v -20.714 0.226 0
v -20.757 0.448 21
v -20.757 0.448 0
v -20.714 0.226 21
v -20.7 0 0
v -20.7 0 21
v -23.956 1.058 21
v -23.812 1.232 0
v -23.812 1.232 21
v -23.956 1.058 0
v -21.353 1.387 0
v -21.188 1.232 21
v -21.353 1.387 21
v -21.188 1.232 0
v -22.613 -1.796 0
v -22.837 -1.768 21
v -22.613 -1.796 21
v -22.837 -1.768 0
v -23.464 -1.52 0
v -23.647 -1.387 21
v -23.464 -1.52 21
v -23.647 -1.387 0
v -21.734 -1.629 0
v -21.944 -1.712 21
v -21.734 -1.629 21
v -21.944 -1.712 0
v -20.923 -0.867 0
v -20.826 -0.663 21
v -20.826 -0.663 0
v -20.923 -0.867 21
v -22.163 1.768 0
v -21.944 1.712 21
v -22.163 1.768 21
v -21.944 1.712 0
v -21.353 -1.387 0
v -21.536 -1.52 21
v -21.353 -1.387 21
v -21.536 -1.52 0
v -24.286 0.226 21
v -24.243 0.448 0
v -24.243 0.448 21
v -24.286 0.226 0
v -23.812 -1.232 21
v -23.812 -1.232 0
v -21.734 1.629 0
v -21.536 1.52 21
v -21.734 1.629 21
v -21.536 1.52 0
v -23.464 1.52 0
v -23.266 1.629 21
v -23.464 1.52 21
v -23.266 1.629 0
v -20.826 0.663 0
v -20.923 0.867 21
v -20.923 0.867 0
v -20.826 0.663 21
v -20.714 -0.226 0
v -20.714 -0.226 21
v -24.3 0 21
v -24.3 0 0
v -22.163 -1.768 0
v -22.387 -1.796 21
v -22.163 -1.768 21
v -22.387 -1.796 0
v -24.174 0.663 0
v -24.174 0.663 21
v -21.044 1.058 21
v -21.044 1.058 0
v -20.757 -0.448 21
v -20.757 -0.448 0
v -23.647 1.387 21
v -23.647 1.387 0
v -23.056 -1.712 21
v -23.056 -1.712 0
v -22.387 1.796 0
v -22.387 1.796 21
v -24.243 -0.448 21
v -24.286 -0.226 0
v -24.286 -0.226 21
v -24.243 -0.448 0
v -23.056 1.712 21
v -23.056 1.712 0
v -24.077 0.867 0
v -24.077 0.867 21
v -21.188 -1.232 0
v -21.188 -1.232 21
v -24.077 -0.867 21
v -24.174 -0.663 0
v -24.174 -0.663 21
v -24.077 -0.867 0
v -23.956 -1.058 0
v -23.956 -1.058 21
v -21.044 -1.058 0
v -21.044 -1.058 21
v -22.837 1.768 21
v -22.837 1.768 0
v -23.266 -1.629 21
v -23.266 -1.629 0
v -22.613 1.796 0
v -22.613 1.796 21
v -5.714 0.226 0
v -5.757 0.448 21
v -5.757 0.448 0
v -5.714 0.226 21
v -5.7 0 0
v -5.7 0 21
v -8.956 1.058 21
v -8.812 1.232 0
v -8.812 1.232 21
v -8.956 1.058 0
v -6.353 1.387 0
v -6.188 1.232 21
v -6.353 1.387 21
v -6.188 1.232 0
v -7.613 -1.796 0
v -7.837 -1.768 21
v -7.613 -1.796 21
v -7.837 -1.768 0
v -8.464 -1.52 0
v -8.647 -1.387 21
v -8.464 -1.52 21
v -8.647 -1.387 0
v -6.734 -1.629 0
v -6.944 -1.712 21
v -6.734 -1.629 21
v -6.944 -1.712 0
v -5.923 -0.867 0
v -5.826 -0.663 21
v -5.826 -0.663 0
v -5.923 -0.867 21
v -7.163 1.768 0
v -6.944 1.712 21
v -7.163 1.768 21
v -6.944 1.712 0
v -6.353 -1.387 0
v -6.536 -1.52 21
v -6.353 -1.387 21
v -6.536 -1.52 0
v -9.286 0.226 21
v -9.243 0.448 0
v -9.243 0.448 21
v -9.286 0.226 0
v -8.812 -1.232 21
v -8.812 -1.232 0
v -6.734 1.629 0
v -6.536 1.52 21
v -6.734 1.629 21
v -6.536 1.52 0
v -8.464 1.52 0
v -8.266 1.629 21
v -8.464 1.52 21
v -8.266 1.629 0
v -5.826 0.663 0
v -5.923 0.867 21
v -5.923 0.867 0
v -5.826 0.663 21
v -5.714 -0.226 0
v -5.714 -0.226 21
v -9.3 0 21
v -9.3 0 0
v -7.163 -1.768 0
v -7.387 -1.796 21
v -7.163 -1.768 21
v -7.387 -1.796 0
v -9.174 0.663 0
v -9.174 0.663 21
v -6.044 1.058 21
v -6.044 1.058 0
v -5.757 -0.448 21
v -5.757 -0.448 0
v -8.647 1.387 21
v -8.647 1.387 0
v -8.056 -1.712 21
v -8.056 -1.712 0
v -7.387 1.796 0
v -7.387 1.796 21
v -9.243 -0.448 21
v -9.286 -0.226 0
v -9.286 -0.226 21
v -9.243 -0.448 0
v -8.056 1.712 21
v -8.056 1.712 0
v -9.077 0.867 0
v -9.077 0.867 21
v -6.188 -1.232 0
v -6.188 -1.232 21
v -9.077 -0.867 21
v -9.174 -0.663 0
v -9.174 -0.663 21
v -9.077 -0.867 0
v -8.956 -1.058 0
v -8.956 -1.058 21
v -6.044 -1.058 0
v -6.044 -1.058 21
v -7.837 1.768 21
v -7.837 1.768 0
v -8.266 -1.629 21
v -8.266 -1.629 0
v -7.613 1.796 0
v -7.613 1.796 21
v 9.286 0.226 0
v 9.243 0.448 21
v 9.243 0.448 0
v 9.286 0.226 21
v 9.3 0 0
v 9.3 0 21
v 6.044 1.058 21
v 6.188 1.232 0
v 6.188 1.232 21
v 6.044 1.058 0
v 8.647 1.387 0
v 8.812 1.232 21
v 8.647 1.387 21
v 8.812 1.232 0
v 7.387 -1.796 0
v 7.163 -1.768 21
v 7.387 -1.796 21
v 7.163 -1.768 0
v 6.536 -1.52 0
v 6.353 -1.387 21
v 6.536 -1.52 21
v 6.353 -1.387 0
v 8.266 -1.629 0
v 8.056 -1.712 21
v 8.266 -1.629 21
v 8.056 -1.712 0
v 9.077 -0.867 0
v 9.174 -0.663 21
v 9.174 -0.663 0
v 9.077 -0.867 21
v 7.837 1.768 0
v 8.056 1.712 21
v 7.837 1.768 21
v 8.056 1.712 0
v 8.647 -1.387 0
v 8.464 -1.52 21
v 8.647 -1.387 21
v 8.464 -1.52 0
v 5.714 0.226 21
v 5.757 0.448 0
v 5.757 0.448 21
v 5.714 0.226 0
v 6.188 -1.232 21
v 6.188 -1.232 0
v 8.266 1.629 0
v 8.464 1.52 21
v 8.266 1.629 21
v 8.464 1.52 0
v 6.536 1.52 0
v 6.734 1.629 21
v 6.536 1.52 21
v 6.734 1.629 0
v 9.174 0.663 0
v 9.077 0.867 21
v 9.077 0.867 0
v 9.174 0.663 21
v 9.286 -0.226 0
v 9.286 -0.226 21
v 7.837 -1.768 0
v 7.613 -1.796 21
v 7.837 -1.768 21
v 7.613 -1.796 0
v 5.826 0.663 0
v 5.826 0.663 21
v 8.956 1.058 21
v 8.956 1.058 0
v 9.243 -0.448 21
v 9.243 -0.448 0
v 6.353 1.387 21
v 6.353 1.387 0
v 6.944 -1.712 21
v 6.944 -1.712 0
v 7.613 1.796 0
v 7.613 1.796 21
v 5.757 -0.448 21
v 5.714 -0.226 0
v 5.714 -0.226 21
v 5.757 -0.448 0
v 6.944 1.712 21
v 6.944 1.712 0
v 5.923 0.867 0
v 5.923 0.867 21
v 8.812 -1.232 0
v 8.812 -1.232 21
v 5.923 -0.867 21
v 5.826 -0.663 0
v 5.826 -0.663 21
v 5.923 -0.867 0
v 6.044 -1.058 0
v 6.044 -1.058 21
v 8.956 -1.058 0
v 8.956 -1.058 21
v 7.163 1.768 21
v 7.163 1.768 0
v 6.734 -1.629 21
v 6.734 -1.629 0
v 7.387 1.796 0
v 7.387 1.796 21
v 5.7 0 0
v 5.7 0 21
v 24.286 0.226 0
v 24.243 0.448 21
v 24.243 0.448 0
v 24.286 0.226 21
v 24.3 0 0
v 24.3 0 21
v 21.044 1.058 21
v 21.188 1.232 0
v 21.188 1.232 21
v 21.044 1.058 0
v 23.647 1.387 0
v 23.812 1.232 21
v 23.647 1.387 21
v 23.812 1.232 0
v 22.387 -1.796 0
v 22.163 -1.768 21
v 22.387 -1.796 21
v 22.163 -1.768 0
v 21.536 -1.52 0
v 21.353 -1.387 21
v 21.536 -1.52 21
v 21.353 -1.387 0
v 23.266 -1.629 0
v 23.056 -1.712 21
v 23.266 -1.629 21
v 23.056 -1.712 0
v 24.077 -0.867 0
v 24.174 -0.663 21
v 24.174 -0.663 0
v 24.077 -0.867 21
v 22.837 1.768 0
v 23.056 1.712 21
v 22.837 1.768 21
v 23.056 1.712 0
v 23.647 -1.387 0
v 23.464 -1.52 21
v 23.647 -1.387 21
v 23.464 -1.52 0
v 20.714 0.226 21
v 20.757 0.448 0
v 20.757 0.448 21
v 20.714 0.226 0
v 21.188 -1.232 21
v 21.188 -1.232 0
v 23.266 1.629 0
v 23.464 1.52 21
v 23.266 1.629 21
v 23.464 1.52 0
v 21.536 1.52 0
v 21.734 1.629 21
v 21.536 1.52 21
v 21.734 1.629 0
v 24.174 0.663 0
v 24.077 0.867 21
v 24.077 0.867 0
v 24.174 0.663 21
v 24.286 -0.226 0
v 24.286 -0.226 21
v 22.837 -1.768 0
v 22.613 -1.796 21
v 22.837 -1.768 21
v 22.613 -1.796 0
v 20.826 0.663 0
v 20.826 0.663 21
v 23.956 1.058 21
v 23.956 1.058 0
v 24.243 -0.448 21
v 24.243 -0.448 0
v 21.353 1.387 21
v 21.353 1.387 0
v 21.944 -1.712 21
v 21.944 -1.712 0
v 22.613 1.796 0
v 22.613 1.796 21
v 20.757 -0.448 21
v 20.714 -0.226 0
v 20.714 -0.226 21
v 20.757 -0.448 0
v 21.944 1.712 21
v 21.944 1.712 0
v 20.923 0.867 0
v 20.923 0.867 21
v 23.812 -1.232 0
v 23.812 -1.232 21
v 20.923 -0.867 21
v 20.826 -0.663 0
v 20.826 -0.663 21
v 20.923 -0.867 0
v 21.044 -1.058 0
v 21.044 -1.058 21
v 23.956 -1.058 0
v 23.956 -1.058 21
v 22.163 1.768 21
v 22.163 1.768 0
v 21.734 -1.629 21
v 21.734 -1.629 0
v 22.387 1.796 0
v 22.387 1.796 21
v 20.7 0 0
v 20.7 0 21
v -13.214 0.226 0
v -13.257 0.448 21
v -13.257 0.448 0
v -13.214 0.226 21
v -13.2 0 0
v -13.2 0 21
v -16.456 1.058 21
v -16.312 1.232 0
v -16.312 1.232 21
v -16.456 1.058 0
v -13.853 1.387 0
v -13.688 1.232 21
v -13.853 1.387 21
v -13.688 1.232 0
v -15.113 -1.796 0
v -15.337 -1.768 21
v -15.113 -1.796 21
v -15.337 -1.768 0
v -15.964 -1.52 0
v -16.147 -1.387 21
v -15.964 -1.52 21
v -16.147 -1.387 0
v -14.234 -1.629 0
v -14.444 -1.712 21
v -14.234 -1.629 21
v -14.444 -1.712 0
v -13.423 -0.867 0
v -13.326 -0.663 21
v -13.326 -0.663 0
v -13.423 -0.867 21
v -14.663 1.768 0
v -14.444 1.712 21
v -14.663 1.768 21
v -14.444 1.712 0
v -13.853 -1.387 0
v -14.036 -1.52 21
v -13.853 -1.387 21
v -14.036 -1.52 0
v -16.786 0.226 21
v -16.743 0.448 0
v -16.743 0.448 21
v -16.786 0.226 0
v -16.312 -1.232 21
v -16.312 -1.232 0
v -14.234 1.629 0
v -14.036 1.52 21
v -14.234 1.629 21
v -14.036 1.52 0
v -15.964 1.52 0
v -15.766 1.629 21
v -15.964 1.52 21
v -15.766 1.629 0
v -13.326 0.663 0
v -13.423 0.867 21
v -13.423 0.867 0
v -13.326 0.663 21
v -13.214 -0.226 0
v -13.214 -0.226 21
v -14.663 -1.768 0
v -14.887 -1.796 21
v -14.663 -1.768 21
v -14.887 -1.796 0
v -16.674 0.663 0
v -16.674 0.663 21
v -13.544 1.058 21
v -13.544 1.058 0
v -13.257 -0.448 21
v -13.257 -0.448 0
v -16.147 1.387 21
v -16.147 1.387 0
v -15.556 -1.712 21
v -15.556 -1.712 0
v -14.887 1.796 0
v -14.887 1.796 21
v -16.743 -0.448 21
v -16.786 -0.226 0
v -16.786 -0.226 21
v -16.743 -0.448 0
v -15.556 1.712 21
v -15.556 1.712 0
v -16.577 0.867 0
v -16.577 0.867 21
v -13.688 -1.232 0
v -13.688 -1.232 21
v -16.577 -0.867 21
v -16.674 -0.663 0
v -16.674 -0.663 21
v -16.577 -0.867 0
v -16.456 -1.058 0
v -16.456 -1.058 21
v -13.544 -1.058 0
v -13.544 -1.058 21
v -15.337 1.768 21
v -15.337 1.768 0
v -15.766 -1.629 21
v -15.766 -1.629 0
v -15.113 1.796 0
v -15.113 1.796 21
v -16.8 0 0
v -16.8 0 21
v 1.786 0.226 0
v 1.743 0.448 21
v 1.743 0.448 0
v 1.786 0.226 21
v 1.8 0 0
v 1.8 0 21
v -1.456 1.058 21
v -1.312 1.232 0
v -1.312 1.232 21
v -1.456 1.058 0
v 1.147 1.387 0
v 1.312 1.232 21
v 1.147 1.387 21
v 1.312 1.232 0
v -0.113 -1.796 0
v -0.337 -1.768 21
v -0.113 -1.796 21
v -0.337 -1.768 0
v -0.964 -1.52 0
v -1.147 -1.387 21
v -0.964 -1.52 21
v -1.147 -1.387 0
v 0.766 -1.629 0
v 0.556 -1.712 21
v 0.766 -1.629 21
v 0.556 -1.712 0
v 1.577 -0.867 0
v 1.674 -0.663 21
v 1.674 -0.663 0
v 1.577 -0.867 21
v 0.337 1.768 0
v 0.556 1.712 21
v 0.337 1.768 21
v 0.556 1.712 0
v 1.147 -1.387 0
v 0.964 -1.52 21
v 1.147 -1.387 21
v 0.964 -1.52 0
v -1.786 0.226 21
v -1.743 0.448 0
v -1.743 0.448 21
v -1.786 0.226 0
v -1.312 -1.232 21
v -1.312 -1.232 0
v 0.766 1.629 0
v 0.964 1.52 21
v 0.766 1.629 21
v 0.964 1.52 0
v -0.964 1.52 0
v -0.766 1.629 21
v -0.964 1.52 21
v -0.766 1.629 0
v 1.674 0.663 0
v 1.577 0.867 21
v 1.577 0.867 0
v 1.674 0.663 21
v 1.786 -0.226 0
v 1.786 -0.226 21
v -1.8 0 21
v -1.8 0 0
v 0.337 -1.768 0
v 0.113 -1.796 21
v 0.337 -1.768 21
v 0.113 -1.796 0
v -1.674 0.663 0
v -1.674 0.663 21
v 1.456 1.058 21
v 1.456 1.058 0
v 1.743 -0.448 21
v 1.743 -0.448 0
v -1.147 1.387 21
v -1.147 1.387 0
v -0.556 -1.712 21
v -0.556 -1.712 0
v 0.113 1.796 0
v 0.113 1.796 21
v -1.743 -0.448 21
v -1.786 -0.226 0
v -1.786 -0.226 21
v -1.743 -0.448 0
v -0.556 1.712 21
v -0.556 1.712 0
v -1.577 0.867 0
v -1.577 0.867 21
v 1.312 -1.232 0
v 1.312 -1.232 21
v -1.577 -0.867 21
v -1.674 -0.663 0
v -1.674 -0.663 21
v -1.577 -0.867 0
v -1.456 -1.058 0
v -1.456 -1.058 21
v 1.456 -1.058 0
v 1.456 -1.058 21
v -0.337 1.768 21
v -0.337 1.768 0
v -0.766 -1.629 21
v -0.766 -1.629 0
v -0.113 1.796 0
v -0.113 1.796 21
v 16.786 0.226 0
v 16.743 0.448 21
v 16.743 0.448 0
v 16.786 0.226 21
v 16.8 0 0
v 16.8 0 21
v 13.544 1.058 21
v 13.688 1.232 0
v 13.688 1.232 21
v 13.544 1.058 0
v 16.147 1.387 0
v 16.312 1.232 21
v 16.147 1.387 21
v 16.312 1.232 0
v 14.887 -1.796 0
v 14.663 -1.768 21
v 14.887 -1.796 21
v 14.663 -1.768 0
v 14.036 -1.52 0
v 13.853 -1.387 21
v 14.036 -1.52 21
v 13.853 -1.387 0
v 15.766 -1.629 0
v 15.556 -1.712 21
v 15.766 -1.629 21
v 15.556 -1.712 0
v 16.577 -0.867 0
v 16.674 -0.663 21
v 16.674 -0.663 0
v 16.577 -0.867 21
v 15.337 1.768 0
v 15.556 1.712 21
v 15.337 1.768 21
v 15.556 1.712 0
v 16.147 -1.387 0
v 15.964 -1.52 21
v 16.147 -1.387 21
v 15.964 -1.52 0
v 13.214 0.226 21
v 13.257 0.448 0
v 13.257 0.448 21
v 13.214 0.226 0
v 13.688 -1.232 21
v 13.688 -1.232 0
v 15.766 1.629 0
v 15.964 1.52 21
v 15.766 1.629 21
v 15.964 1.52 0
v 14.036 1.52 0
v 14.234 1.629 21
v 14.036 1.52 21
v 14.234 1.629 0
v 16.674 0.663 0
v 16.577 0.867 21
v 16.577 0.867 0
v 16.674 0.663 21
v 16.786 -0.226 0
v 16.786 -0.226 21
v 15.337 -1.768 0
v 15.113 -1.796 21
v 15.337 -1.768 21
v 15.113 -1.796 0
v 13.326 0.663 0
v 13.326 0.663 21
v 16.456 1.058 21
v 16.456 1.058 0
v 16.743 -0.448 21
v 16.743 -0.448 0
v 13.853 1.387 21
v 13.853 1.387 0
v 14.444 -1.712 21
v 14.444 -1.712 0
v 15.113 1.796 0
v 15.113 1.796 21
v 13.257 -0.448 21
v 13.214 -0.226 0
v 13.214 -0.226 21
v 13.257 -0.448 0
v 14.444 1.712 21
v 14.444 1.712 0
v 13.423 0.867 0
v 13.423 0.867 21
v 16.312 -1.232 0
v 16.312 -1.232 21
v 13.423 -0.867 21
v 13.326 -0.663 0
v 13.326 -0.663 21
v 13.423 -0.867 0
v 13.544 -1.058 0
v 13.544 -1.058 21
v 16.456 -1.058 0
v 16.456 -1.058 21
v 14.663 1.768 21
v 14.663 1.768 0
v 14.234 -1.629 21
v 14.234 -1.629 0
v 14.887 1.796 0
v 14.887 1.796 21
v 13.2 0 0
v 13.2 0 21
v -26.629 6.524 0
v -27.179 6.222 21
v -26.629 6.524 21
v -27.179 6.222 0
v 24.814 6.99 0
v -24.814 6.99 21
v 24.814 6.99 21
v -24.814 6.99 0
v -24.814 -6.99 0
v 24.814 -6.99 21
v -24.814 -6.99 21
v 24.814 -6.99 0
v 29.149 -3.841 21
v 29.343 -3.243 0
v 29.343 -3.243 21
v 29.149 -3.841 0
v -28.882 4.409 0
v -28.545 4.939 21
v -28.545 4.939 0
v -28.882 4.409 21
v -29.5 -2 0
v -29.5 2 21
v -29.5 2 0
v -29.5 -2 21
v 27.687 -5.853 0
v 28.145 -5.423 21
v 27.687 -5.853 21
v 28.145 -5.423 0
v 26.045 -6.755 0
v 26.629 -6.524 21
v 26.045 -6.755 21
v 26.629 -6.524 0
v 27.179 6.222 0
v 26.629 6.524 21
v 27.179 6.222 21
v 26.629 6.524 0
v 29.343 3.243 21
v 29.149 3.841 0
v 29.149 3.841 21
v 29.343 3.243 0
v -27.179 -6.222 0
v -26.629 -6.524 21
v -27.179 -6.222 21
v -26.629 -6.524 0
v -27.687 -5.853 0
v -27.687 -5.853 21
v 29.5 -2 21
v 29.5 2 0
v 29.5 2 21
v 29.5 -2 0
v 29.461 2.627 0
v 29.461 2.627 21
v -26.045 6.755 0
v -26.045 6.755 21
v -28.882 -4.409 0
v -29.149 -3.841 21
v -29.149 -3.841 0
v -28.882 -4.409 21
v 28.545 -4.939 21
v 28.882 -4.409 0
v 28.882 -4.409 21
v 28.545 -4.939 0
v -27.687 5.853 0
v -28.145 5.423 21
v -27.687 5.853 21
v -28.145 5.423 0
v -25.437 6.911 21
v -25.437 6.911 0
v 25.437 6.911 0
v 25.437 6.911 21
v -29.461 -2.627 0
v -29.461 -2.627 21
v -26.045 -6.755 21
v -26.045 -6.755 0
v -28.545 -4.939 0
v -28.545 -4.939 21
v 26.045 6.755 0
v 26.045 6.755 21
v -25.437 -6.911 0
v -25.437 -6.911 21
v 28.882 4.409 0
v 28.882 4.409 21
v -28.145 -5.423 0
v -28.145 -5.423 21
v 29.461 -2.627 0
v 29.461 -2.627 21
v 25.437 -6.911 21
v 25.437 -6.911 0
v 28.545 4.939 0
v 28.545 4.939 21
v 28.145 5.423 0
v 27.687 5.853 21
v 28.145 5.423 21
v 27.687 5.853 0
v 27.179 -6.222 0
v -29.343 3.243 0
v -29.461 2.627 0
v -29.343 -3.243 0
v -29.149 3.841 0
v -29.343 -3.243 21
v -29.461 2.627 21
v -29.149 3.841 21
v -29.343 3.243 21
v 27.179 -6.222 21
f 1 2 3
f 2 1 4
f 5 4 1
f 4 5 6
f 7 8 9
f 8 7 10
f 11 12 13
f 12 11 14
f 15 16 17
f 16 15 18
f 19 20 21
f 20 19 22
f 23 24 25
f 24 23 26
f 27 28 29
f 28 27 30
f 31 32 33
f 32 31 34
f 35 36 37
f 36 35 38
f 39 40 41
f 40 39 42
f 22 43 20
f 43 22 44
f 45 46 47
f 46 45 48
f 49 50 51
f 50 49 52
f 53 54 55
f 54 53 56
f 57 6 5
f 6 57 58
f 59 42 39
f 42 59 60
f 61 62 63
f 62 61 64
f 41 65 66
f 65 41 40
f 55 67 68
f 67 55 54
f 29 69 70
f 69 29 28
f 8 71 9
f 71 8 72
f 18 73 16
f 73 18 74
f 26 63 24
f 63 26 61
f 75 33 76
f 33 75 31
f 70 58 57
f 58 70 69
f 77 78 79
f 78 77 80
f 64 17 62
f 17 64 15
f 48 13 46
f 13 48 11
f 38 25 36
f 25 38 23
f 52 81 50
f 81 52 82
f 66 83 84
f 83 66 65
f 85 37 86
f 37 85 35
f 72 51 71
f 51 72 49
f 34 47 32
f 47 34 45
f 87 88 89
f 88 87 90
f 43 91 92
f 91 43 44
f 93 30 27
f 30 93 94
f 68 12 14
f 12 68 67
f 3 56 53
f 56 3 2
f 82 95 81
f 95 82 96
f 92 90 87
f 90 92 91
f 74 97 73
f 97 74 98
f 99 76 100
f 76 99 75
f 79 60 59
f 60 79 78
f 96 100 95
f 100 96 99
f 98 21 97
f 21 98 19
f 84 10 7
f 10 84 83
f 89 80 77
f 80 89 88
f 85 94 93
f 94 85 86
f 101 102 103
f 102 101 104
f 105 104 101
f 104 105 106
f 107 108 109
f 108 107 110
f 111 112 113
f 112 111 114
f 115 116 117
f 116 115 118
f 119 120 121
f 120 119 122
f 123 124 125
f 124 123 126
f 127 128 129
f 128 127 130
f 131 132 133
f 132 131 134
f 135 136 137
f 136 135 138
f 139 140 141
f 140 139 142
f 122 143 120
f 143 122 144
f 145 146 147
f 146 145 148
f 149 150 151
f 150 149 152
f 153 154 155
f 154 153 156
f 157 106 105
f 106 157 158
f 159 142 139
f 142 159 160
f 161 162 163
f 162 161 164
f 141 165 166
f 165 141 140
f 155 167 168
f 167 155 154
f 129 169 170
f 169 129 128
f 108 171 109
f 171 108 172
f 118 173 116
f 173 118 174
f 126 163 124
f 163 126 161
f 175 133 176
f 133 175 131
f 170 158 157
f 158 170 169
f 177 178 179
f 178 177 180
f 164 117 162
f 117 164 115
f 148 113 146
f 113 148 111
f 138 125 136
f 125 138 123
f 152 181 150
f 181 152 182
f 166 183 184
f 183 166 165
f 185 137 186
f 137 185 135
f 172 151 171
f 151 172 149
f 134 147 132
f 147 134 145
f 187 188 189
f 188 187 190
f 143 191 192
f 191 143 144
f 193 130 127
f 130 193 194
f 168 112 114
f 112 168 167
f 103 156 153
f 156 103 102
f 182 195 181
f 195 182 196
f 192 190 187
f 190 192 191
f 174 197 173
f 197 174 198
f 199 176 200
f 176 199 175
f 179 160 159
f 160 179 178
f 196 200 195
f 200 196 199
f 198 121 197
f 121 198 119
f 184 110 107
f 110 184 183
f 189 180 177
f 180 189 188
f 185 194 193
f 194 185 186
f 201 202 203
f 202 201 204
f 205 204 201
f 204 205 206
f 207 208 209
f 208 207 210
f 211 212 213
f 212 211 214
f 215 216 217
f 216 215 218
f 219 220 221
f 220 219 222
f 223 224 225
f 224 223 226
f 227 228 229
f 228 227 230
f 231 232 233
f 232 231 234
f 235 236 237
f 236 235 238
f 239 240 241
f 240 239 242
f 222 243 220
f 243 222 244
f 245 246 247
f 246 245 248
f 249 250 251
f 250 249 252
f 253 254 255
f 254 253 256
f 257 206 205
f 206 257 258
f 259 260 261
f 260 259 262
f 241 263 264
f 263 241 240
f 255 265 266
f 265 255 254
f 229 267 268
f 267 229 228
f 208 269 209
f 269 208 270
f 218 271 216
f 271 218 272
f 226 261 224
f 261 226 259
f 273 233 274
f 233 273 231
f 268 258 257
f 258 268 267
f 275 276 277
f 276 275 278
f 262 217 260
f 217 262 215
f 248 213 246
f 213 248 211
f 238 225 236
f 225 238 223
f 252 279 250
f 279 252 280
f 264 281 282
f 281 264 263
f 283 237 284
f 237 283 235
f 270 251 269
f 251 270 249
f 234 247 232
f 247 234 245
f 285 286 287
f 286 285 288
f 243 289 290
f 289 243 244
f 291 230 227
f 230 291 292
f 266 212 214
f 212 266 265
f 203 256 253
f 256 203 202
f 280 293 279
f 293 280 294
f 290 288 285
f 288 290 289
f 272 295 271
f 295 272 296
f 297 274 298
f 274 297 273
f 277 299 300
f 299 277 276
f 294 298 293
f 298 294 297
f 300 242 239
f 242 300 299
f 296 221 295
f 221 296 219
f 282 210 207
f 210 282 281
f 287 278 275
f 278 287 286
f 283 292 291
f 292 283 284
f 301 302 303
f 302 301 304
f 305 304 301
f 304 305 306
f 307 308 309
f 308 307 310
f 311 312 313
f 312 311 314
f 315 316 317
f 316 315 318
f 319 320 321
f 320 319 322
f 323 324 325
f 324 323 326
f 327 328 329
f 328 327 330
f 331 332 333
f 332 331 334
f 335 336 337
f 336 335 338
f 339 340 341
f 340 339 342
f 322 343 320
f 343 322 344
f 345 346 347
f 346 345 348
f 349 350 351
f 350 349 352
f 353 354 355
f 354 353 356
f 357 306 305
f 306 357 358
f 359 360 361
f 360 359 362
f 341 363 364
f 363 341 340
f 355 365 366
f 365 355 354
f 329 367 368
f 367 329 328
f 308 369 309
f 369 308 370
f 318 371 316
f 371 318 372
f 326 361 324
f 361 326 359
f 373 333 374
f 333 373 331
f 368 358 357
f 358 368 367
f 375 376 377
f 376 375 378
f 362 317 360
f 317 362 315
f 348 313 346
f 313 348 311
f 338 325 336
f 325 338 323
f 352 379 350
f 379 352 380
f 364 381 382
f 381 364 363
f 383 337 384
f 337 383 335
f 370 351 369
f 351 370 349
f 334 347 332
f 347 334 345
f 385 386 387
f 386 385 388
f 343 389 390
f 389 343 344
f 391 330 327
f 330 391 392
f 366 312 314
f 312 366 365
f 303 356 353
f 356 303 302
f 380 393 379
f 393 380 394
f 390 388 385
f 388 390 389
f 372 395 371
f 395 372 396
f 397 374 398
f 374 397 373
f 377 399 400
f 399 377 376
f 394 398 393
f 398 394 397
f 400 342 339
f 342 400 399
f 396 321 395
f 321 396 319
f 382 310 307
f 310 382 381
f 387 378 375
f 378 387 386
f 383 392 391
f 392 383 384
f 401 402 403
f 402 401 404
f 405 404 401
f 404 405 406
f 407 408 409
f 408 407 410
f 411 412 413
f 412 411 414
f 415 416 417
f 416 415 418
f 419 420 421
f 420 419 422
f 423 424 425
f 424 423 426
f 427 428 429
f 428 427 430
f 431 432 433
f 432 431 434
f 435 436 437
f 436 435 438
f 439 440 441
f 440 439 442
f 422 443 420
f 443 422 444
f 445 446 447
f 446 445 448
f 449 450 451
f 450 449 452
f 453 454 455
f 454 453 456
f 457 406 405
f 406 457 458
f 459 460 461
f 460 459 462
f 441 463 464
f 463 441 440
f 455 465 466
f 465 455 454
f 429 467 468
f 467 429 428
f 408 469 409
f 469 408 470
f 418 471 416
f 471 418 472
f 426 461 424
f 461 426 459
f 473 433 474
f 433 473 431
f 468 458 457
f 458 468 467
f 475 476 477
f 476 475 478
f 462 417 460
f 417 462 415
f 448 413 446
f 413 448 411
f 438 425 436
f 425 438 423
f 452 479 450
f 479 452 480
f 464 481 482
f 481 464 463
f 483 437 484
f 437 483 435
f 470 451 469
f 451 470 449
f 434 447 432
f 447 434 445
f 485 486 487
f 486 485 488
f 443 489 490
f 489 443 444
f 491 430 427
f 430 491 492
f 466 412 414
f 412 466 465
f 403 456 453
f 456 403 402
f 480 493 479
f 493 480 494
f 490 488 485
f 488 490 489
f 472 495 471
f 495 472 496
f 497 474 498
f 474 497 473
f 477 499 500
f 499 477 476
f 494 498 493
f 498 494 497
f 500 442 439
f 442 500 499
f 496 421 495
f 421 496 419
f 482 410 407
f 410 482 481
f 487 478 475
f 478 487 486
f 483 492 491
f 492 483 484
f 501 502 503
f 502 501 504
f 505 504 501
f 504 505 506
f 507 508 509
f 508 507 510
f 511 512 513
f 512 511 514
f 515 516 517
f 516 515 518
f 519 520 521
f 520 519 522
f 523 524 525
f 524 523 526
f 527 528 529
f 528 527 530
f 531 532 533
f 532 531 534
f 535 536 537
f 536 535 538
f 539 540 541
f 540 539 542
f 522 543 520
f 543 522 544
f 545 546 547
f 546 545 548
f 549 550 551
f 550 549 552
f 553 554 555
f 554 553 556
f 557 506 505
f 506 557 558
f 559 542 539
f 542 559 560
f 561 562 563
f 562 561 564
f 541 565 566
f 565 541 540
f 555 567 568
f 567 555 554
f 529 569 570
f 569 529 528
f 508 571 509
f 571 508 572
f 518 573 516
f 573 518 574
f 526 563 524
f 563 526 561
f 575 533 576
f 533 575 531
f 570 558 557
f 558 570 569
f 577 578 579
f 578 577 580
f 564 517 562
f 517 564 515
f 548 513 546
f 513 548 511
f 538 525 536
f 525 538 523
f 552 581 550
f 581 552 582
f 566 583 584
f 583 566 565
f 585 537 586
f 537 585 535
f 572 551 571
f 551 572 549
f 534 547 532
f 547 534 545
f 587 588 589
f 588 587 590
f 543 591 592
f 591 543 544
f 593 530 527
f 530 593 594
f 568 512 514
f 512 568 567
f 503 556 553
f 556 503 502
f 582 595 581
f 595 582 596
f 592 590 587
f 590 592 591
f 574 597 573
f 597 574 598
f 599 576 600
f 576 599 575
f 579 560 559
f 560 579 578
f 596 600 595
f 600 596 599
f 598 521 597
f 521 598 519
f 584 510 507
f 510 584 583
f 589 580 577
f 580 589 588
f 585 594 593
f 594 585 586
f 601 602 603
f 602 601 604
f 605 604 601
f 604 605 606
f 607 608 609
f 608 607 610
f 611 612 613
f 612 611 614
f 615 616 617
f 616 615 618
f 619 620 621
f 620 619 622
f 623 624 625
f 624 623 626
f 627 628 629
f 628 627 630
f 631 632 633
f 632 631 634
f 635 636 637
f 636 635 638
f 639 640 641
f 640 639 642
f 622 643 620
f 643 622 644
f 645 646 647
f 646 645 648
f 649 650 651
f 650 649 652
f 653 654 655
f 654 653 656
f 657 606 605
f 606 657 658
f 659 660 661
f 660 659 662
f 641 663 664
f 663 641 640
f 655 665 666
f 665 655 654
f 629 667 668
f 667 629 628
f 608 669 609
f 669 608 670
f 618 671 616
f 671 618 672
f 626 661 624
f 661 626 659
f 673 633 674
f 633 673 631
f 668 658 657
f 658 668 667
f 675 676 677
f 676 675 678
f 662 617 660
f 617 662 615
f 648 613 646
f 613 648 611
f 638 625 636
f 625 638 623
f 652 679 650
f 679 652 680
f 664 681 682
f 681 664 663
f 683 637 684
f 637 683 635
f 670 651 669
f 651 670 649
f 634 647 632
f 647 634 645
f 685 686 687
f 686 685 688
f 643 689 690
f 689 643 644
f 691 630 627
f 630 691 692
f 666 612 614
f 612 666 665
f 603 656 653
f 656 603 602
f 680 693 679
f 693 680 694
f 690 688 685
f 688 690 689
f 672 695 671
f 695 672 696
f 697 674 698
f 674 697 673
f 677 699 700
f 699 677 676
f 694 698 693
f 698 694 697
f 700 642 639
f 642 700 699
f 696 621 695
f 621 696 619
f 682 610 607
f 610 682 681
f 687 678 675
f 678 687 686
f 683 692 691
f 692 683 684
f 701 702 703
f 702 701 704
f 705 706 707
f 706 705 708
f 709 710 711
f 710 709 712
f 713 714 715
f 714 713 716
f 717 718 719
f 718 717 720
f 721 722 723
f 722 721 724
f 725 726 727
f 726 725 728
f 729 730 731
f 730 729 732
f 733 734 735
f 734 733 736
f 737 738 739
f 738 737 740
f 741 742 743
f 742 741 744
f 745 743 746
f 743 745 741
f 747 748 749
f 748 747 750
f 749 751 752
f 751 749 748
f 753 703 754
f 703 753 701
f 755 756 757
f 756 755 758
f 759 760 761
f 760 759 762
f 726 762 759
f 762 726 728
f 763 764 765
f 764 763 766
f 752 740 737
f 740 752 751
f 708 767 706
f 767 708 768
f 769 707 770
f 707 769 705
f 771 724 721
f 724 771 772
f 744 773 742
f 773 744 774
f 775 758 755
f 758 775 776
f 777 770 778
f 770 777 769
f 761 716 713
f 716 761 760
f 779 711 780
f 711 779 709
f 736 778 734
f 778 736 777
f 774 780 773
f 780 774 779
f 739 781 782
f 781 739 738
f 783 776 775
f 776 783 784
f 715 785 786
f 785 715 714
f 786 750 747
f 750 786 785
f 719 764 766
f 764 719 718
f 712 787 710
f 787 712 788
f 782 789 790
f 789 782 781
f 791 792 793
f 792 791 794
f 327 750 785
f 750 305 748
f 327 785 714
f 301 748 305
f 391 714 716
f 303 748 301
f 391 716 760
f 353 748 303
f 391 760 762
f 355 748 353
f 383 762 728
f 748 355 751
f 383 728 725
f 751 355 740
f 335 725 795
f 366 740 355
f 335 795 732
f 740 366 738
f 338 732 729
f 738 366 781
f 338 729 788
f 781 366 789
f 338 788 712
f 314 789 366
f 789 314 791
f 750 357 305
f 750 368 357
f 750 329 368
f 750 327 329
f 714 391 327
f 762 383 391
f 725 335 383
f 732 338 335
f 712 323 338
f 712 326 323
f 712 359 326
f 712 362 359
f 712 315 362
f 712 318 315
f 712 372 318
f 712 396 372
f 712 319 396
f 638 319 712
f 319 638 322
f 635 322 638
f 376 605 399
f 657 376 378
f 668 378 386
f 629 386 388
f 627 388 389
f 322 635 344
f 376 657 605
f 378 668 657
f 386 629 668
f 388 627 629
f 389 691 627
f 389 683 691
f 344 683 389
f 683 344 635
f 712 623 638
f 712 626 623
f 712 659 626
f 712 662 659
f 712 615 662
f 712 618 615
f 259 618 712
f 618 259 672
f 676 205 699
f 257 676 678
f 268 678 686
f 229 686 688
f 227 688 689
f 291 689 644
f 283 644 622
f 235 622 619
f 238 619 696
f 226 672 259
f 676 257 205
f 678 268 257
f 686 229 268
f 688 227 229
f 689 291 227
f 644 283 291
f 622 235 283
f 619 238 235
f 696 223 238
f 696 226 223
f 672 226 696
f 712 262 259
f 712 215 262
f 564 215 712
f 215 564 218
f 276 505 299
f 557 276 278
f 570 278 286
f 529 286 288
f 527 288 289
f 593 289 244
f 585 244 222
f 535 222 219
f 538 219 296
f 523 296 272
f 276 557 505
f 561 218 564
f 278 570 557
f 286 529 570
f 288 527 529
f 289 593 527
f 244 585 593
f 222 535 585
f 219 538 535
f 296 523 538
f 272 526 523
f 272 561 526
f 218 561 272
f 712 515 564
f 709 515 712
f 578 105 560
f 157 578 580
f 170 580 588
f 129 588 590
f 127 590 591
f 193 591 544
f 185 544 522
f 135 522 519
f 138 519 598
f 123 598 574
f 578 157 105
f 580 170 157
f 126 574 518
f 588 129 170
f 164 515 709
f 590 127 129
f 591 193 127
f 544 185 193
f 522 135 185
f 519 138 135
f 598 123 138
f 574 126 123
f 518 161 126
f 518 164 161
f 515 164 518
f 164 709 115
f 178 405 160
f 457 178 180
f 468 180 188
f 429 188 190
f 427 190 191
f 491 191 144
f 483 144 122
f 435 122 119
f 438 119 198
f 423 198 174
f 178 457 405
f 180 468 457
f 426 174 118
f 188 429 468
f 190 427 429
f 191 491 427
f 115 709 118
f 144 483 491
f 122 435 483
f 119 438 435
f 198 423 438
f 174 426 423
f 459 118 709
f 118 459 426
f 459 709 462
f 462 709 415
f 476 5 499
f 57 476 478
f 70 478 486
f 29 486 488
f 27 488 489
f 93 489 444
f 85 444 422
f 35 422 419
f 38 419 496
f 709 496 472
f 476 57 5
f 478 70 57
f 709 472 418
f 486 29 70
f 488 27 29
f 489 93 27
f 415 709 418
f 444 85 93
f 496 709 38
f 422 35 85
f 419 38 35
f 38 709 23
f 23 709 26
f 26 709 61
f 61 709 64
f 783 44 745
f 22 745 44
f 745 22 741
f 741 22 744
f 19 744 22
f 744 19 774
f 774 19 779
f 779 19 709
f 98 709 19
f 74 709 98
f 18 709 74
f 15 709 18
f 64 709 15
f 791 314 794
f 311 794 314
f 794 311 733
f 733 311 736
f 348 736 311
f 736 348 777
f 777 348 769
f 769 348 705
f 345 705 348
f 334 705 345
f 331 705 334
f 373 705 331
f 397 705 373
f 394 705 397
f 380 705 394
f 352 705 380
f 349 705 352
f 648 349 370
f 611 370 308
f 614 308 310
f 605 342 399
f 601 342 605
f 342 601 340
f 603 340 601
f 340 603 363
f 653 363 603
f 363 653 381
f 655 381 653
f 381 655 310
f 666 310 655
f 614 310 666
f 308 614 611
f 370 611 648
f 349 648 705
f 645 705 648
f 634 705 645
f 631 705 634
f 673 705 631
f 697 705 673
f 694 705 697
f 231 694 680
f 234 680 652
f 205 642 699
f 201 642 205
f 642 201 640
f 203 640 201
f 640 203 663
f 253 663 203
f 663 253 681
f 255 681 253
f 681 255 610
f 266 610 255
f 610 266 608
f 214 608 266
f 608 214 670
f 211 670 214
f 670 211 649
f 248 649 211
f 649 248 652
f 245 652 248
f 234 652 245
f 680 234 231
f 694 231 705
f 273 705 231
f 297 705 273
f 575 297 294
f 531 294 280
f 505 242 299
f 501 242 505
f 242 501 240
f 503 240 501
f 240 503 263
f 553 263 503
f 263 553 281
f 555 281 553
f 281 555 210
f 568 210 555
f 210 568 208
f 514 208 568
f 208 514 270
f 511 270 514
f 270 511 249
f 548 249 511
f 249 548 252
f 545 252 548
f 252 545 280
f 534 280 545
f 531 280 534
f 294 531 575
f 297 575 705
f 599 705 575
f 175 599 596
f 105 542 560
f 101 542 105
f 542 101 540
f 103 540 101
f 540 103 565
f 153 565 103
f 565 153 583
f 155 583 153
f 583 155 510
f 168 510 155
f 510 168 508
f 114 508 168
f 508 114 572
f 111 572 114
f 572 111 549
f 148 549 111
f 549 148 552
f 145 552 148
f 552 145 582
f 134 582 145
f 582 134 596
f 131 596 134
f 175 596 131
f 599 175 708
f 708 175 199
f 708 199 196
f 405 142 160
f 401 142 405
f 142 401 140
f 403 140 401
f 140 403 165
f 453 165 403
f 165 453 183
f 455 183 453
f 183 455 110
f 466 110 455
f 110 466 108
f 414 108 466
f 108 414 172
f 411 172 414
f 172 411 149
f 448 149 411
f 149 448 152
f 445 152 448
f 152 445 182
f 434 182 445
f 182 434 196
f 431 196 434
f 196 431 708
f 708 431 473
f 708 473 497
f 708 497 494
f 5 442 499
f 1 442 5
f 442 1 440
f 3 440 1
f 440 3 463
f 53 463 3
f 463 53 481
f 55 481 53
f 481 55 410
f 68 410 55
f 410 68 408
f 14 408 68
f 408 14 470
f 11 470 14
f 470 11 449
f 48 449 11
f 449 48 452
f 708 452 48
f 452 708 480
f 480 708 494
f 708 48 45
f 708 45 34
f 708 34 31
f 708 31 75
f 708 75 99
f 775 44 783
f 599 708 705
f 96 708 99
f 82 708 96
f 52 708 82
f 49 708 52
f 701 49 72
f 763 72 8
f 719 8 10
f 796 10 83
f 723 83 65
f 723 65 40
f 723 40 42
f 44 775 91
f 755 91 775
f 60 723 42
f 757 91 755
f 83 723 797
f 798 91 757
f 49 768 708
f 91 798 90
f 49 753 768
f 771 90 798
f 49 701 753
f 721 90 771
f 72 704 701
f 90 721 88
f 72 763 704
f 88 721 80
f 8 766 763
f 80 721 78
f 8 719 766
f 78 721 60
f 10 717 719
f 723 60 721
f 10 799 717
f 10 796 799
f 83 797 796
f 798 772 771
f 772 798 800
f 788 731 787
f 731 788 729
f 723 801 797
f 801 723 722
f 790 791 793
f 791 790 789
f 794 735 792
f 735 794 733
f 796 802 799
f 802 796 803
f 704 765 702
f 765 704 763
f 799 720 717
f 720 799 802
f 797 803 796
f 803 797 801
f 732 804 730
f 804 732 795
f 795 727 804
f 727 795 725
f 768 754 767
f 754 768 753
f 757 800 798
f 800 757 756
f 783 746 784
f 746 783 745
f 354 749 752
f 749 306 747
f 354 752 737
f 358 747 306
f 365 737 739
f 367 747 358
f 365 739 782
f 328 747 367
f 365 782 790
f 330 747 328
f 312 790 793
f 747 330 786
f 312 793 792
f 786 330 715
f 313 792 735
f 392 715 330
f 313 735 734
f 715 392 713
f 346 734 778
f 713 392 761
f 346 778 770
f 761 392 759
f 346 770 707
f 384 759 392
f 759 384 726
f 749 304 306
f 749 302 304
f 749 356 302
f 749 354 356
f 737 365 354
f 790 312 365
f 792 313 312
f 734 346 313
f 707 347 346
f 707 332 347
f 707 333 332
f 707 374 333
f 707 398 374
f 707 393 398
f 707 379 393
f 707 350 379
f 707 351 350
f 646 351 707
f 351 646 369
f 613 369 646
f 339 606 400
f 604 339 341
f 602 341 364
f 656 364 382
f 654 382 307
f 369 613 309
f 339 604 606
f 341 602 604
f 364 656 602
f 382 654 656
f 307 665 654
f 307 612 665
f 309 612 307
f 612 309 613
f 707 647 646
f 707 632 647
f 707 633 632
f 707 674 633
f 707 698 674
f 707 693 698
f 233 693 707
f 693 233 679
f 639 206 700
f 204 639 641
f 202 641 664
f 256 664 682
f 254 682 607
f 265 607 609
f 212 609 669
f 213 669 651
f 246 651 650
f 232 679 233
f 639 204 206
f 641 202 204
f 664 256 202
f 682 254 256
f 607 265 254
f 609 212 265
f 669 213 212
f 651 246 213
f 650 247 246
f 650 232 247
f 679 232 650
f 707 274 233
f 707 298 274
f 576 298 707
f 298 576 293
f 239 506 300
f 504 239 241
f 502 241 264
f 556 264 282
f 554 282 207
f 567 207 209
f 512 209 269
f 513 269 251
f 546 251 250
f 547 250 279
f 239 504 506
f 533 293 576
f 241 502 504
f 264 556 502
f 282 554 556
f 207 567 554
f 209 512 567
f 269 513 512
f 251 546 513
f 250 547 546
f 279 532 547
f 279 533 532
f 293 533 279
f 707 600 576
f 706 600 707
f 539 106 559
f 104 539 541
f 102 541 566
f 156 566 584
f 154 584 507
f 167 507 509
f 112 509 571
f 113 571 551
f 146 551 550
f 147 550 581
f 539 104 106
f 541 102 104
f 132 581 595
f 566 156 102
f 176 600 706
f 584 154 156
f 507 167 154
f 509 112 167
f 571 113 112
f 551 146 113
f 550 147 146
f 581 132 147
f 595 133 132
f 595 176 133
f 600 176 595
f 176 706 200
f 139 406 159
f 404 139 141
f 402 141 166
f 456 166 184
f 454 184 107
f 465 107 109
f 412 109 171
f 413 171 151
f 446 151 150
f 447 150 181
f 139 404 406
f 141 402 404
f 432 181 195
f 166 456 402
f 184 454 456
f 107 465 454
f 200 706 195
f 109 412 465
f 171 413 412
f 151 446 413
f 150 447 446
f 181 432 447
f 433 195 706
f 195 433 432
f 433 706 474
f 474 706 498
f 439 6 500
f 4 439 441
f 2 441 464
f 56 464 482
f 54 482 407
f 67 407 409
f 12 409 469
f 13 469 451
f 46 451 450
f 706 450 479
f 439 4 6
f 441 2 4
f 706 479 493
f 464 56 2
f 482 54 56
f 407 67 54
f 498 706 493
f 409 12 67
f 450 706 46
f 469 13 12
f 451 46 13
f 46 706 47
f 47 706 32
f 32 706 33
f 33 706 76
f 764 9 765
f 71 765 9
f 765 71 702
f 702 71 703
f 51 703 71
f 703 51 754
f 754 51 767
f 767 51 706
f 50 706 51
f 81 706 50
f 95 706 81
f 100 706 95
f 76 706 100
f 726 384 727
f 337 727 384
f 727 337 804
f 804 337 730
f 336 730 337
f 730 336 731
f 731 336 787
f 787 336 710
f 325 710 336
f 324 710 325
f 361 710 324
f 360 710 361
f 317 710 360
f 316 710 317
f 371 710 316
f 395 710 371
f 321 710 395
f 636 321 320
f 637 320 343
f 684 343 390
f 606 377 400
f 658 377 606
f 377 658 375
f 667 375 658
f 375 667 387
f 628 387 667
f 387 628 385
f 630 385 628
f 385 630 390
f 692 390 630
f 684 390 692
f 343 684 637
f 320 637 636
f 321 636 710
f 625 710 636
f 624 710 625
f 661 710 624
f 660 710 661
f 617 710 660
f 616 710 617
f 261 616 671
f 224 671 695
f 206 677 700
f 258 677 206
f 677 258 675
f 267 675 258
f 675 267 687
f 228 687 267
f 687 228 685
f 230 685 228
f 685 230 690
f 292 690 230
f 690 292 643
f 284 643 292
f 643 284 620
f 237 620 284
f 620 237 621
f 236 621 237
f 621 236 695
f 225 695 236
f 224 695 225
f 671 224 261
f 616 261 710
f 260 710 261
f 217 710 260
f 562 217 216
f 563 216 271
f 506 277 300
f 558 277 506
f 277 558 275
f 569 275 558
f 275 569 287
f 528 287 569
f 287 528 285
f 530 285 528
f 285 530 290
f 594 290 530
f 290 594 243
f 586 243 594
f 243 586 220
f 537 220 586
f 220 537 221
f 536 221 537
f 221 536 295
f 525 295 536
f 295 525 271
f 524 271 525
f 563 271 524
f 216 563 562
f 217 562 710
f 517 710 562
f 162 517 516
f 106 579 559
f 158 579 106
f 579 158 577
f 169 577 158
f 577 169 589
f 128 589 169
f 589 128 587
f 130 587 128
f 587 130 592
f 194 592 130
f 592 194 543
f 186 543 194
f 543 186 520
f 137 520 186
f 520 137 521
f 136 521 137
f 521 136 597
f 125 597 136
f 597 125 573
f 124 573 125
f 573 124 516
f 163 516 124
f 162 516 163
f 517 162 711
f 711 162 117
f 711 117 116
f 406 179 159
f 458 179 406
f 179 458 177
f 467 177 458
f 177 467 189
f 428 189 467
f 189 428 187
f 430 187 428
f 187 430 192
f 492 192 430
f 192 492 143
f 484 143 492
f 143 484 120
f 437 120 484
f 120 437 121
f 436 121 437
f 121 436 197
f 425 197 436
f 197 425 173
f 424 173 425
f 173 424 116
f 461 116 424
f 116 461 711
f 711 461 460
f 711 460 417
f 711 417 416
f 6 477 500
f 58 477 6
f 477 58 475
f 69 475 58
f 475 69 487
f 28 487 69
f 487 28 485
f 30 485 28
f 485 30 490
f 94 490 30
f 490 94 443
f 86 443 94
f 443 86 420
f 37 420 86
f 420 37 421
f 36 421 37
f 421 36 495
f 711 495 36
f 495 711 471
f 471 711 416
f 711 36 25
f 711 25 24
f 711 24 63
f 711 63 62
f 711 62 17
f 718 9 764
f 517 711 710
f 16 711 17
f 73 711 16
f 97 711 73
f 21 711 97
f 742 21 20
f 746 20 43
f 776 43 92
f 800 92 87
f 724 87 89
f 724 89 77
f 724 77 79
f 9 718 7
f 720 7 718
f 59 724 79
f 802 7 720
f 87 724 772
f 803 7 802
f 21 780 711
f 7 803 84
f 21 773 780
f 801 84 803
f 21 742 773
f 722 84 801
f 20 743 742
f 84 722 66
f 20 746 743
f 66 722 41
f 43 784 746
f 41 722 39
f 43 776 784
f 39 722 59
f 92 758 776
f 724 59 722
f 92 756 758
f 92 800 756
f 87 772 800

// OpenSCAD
$fn = 50;


difference() {
	union() {
		hull() {
			translate(v = [-24.5000000000, 2.0000000000, 0]) {
				cylinder(h = 21, r = 5);
			}
			translate(v = [24.5000000000, 2.0000000000, 0]) {
				cylinder(h = 21, r = 5);
			}
			translate(v = [-24.5000000000, -2.0000000000, 0]) {
				cylinder(h = 21, r = 5);
			}
			translate(v = [24.5000000000, -2.0000000000, 0]) {
				cylinder(h = 21, r = 5);
			}
		}
	}
	union() {
		translate(v = [-22.5000000000, 0.0000000000, 0]) {
			translate(v = [0, 0, -100]) {
				cylinder(h = 200, r = 1.8000000000);
			}
		}
		translate(v = [-7.5000000000, 0.0000000000, 0]) {
			translate(v = [0, 0, -100]) {
				cylinder(h = 200, r = 1.8000000000);
			}
		}
		translate(v = [7.5000000000, 0.0000000000, 0]) {
			translate(v = [0, 0, -100]) {
				cylinder(h = 200, r = 1.8000000000);
			}
		}
		translate(v = [22.5000000000, 0.0000000000, 0]) {
			translate(v = [0, 0, -100]) {
				cylinder(h = 200, r = 1.8000000000);
			}
		}
		translate(v = [-22.5000000000, 0.0000000000, 0]) {
			translate(v = [0, 0, -100]) {
				cylinder(h = 200, r = 1.8000000000);
			}
		}
		translate(v = [-15.0000000000, 0.0000000000, 0]) {
			translate(v = [0, 0, -100]) {
				cylinder(h = 200, r = 1.8000000000);
			}
		}
		translate(v = [-7.5000000000, 0.0000000000, 0]) {
			translate(v = [0, 0, -100]) {
				cylinder(h = 200, r = 1.8000000000);
			}
		}
		translate(v = [0, 0, -100]) {
			cylinder(h = 200, r = 1.8000000000);
		}
		translate(v = [7.5000000000, 0.0000000000, 0]) {
			translate(v = [0, 0, -100]) {
				cylinder(h = 200, r = 1.8000000000);
			}
		}
		translate(v = [15.0000000000, 0.0000000000, 0]) {
			translate(v = [0, 0, -100]) {
				cylinder(h = 200, r = 1.8000000000);
			}
		}
		translate(v = [22.5000000000, 0.0000000000, 0]) {
			translate(v = [0, 0, -100]) {
				cylinder(h = 200, r = 1.8000000000);
			}
		}
	}
}
